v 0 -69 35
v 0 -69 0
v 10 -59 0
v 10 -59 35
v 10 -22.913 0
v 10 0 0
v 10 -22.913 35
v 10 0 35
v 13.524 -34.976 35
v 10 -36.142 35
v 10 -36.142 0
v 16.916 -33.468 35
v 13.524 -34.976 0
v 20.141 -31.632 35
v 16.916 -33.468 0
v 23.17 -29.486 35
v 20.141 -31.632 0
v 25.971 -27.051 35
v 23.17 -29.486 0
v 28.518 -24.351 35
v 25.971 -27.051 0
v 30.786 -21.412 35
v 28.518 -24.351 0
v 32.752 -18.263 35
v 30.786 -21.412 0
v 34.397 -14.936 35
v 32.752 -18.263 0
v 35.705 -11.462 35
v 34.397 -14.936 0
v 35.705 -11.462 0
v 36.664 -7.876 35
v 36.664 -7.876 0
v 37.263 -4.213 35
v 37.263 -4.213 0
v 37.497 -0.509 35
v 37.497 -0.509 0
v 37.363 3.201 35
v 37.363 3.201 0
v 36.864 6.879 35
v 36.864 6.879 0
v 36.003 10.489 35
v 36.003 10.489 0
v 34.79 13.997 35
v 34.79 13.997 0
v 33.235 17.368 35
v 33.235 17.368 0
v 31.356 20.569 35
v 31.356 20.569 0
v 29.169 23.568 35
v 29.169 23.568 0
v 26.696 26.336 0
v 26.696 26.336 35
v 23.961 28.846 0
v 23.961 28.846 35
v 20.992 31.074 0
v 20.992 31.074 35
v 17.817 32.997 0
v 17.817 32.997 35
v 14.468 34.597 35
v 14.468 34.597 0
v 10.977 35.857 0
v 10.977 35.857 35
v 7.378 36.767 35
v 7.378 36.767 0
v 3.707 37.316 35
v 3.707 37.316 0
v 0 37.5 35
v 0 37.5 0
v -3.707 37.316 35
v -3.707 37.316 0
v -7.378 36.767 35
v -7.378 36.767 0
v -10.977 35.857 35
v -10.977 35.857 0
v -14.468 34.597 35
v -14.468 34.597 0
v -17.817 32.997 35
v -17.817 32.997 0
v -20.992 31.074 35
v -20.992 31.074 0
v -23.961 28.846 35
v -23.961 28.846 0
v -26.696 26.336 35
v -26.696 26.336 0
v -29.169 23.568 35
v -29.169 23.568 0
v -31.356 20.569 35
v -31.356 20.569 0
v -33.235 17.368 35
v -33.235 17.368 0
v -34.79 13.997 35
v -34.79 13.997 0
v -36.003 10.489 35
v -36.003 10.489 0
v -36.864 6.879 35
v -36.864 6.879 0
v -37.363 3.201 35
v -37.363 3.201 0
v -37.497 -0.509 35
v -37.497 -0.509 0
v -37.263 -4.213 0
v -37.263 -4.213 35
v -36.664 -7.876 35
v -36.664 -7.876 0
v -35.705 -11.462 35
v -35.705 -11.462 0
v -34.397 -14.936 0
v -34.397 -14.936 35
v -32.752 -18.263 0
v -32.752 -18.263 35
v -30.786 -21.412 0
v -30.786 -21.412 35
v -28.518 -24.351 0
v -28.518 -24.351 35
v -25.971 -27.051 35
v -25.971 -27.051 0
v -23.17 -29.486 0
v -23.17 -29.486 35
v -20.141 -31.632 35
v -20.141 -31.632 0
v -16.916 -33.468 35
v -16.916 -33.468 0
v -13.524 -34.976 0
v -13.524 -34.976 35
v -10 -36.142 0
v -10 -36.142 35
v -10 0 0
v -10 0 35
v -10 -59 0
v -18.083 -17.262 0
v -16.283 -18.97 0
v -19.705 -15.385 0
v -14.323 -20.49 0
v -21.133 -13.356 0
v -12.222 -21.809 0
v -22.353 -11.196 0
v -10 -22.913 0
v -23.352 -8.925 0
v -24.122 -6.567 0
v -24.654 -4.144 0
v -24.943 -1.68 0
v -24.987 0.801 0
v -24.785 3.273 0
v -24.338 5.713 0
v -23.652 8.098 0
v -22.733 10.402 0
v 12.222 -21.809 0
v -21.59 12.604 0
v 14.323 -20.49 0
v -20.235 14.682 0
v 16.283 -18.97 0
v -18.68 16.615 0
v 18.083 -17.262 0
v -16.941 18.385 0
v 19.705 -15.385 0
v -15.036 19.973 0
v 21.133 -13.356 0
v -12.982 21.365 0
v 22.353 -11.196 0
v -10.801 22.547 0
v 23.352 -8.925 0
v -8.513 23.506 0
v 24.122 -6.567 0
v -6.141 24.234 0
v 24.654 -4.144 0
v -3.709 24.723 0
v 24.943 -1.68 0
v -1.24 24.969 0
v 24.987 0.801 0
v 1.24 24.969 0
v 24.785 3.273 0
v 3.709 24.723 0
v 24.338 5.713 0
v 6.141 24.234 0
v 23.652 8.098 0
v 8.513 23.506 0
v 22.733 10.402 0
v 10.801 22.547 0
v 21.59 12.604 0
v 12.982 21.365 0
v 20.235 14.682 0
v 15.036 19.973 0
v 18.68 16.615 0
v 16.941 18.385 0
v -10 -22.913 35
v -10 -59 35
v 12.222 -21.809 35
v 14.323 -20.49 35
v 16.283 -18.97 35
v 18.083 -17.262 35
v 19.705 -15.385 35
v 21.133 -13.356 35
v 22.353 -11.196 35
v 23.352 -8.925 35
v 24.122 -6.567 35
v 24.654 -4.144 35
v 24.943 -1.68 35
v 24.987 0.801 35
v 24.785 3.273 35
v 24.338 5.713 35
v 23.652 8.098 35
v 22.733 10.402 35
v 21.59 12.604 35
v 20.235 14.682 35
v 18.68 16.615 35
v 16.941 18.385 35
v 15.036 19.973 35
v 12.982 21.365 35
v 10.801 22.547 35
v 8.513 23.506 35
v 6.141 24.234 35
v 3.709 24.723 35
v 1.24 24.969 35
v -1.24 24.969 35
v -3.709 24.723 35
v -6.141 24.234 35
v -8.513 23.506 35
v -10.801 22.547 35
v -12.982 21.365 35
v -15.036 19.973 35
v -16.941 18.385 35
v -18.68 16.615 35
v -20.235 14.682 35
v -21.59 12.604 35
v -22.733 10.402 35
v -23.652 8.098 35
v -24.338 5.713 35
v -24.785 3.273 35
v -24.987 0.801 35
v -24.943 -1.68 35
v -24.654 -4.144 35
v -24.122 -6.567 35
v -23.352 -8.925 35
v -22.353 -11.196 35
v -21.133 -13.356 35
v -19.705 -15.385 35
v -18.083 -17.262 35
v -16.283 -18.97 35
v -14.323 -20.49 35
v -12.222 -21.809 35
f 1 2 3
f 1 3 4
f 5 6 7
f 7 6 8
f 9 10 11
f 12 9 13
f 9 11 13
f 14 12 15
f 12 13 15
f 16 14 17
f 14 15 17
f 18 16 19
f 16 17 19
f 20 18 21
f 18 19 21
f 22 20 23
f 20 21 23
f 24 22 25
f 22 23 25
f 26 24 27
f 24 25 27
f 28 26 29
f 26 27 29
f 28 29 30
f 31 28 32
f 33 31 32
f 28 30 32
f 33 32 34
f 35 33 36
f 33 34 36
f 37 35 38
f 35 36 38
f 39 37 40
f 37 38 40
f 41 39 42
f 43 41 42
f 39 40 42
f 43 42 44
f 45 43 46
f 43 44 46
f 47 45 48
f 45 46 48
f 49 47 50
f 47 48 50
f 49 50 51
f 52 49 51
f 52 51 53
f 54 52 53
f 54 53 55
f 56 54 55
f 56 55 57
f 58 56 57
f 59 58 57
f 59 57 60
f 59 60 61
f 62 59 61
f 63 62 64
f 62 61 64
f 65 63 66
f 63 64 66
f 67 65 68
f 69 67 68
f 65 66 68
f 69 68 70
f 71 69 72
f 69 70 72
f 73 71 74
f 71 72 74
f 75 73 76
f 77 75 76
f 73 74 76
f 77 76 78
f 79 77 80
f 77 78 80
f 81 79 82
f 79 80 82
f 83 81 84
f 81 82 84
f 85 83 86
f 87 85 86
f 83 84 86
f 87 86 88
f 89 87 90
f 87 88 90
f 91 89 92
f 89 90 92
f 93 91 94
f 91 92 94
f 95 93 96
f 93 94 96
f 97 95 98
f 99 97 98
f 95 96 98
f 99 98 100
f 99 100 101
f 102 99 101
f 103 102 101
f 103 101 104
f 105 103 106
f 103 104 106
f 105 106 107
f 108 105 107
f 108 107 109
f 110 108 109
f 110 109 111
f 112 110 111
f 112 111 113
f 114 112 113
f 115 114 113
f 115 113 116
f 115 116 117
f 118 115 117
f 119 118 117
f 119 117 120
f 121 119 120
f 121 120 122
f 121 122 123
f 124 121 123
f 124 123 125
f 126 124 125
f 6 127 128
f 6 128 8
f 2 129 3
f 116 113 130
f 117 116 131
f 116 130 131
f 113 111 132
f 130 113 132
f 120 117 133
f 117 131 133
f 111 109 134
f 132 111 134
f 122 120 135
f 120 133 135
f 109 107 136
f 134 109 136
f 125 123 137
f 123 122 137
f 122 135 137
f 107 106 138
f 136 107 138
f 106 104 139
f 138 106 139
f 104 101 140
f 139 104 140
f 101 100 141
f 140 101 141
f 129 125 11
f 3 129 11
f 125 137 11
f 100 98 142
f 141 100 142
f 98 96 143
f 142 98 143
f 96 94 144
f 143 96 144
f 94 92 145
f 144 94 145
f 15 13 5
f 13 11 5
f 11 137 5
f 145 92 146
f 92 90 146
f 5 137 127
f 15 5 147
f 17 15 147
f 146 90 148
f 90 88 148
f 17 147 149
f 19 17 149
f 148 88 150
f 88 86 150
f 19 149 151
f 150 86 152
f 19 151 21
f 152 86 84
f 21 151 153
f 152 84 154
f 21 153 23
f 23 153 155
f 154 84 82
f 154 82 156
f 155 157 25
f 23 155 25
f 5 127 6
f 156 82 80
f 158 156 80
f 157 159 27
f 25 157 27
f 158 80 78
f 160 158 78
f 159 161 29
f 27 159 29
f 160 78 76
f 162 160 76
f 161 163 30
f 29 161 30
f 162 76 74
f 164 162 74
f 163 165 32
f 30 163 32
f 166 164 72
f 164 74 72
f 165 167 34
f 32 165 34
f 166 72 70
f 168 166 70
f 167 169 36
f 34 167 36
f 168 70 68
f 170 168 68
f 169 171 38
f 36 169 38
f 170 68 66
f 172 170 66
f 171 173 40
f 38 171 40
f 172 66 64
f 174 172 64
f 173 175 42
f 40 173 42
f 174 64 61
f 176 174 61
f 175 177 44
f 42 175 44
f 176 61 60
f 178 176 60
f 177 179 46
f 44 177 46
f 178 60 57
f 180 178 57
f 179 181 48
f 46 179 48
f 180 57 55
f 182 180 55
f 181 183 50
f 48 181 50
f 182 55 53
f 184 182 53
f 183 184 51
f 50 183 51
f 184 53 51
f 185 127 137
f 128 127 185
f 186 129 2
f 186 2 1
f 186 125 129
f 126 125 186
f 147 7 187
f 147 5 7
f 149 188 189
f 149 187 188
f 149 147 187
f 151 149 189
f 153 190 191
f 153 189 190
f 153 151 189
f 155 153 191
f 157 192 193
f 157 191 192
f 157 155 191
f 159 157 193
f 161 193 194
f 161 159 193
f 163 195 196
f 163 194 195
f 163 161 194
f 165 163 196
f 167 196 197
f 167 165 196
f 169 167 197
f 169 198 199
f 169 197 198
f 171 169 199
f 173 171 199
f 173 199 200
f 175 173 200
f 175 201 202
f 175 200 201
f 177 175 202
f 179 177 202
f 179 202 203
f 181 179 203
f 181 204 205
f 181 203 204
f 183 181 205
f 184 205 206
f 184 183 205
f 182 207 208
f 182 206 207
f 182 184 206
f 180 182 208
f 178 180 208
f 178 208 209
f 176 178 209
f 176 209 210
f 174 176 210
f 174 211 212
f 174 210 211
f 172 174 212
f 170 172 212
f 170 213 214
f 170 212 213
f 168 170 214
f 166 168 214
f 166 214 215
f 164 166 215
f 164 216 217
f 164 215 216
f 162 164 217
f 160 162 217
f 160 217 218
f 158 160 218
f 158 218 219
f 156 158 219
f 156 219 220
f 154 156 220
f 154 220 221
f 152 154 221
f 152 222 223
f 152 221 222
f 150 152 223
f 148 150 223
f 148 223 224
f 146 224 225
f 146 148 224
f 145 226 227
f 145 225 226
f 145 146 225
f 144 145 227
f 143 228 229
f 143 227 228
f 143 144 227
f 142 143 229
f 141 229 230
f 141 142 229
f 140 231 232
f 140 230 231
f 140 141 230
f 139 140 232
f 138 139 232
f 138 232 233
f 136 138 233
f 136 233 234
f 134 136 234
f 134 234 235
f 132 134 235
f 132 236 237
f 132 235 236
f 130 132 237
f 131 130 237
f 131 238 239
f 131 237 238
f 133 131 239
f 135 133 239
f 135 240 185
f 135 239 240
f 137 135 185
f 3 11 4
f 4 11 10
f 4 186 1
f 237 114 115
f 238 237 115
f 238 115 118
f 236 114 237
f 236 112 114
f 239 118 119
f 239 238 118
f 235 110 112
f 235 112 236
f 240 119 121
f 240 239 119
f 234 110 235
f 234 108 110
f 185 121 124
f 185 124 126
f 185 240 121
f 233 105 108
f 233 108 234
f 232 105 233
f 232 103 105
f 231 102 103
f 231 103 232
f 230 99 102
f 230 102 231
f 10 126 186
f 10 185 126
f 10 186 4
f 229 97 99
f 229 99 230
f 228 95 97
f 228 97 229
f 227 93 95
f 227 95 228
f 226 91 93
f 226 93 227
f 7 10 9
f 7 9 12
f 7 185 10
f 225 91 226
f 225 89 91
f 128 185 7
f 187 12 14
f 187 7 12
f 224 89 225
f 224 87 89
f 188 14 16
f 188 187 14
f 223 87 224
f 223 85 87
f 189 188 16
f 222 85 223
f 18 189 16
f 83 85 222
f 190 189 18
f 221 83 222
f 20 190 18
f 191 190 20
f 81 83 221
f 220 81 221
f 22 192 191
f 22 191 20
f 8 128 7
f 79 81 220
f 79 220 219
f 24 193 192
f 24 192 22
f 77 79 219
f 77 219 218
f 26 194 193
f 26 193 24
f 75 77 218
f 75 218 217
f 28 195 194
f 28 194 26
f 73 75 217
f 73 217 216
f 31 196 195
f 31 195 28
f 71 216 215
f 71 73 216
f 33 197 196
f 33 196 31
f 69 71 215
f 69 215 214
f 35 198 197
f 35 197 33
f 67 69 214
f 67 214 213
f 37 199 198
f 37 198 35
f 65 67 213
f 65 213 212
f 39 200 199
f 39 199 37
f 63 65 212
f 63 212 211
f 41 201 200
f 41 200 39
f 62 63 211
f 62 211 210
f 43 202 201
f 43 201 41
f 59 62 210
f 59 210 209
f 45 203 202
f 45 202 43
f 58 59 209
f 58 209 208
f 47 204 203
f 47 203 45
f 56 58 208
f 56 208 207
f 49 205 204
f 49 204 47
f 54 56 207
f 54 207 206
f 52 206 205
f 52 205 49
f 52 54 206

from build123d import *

# Parameters (mm, degrees)
F0_R     = 37.5
F0_R_2   = 25
F1_DEPTH = 35
F2_W     = 20
F2_H     = 35
F3_DEPTH = 69
F4_SIZE  = 9.99999


# Not quite as in the source:
# - a fillet or chamfer is up to 0.001 mm smaller than in the source, because OpenCascade refuses the exact size


with BuildPart() as f1:
    # F0 (on Top) → F1 (new body)
    with BuildSketch(Plane.XY):
        Circle(F0_R)
        Circle(F0_R_2, mode=Mode.SUBTRACT)
    extrude(amount=F1_DEPTH)

    # F2 (on Front) → F3 (join)
    with BuildSketch(Plane.XZ):
        with Locations((0, 17.5)):
            Rectangle(F2_W, F2_H)
    extrude(amount=F3_DEPTH)

    # F4 (size 10 in the source; OpenCascade refuses exactly that, so slightly less here)
    f4_edges = [f1.edges().sort_by_distance(p)[0] for p in [
        (-10, -69, 17.5),
        (10, -69, 17.5),
    ]]
    chamfer(f4_edges, length=F4_SIZE)


solid = f1.part
